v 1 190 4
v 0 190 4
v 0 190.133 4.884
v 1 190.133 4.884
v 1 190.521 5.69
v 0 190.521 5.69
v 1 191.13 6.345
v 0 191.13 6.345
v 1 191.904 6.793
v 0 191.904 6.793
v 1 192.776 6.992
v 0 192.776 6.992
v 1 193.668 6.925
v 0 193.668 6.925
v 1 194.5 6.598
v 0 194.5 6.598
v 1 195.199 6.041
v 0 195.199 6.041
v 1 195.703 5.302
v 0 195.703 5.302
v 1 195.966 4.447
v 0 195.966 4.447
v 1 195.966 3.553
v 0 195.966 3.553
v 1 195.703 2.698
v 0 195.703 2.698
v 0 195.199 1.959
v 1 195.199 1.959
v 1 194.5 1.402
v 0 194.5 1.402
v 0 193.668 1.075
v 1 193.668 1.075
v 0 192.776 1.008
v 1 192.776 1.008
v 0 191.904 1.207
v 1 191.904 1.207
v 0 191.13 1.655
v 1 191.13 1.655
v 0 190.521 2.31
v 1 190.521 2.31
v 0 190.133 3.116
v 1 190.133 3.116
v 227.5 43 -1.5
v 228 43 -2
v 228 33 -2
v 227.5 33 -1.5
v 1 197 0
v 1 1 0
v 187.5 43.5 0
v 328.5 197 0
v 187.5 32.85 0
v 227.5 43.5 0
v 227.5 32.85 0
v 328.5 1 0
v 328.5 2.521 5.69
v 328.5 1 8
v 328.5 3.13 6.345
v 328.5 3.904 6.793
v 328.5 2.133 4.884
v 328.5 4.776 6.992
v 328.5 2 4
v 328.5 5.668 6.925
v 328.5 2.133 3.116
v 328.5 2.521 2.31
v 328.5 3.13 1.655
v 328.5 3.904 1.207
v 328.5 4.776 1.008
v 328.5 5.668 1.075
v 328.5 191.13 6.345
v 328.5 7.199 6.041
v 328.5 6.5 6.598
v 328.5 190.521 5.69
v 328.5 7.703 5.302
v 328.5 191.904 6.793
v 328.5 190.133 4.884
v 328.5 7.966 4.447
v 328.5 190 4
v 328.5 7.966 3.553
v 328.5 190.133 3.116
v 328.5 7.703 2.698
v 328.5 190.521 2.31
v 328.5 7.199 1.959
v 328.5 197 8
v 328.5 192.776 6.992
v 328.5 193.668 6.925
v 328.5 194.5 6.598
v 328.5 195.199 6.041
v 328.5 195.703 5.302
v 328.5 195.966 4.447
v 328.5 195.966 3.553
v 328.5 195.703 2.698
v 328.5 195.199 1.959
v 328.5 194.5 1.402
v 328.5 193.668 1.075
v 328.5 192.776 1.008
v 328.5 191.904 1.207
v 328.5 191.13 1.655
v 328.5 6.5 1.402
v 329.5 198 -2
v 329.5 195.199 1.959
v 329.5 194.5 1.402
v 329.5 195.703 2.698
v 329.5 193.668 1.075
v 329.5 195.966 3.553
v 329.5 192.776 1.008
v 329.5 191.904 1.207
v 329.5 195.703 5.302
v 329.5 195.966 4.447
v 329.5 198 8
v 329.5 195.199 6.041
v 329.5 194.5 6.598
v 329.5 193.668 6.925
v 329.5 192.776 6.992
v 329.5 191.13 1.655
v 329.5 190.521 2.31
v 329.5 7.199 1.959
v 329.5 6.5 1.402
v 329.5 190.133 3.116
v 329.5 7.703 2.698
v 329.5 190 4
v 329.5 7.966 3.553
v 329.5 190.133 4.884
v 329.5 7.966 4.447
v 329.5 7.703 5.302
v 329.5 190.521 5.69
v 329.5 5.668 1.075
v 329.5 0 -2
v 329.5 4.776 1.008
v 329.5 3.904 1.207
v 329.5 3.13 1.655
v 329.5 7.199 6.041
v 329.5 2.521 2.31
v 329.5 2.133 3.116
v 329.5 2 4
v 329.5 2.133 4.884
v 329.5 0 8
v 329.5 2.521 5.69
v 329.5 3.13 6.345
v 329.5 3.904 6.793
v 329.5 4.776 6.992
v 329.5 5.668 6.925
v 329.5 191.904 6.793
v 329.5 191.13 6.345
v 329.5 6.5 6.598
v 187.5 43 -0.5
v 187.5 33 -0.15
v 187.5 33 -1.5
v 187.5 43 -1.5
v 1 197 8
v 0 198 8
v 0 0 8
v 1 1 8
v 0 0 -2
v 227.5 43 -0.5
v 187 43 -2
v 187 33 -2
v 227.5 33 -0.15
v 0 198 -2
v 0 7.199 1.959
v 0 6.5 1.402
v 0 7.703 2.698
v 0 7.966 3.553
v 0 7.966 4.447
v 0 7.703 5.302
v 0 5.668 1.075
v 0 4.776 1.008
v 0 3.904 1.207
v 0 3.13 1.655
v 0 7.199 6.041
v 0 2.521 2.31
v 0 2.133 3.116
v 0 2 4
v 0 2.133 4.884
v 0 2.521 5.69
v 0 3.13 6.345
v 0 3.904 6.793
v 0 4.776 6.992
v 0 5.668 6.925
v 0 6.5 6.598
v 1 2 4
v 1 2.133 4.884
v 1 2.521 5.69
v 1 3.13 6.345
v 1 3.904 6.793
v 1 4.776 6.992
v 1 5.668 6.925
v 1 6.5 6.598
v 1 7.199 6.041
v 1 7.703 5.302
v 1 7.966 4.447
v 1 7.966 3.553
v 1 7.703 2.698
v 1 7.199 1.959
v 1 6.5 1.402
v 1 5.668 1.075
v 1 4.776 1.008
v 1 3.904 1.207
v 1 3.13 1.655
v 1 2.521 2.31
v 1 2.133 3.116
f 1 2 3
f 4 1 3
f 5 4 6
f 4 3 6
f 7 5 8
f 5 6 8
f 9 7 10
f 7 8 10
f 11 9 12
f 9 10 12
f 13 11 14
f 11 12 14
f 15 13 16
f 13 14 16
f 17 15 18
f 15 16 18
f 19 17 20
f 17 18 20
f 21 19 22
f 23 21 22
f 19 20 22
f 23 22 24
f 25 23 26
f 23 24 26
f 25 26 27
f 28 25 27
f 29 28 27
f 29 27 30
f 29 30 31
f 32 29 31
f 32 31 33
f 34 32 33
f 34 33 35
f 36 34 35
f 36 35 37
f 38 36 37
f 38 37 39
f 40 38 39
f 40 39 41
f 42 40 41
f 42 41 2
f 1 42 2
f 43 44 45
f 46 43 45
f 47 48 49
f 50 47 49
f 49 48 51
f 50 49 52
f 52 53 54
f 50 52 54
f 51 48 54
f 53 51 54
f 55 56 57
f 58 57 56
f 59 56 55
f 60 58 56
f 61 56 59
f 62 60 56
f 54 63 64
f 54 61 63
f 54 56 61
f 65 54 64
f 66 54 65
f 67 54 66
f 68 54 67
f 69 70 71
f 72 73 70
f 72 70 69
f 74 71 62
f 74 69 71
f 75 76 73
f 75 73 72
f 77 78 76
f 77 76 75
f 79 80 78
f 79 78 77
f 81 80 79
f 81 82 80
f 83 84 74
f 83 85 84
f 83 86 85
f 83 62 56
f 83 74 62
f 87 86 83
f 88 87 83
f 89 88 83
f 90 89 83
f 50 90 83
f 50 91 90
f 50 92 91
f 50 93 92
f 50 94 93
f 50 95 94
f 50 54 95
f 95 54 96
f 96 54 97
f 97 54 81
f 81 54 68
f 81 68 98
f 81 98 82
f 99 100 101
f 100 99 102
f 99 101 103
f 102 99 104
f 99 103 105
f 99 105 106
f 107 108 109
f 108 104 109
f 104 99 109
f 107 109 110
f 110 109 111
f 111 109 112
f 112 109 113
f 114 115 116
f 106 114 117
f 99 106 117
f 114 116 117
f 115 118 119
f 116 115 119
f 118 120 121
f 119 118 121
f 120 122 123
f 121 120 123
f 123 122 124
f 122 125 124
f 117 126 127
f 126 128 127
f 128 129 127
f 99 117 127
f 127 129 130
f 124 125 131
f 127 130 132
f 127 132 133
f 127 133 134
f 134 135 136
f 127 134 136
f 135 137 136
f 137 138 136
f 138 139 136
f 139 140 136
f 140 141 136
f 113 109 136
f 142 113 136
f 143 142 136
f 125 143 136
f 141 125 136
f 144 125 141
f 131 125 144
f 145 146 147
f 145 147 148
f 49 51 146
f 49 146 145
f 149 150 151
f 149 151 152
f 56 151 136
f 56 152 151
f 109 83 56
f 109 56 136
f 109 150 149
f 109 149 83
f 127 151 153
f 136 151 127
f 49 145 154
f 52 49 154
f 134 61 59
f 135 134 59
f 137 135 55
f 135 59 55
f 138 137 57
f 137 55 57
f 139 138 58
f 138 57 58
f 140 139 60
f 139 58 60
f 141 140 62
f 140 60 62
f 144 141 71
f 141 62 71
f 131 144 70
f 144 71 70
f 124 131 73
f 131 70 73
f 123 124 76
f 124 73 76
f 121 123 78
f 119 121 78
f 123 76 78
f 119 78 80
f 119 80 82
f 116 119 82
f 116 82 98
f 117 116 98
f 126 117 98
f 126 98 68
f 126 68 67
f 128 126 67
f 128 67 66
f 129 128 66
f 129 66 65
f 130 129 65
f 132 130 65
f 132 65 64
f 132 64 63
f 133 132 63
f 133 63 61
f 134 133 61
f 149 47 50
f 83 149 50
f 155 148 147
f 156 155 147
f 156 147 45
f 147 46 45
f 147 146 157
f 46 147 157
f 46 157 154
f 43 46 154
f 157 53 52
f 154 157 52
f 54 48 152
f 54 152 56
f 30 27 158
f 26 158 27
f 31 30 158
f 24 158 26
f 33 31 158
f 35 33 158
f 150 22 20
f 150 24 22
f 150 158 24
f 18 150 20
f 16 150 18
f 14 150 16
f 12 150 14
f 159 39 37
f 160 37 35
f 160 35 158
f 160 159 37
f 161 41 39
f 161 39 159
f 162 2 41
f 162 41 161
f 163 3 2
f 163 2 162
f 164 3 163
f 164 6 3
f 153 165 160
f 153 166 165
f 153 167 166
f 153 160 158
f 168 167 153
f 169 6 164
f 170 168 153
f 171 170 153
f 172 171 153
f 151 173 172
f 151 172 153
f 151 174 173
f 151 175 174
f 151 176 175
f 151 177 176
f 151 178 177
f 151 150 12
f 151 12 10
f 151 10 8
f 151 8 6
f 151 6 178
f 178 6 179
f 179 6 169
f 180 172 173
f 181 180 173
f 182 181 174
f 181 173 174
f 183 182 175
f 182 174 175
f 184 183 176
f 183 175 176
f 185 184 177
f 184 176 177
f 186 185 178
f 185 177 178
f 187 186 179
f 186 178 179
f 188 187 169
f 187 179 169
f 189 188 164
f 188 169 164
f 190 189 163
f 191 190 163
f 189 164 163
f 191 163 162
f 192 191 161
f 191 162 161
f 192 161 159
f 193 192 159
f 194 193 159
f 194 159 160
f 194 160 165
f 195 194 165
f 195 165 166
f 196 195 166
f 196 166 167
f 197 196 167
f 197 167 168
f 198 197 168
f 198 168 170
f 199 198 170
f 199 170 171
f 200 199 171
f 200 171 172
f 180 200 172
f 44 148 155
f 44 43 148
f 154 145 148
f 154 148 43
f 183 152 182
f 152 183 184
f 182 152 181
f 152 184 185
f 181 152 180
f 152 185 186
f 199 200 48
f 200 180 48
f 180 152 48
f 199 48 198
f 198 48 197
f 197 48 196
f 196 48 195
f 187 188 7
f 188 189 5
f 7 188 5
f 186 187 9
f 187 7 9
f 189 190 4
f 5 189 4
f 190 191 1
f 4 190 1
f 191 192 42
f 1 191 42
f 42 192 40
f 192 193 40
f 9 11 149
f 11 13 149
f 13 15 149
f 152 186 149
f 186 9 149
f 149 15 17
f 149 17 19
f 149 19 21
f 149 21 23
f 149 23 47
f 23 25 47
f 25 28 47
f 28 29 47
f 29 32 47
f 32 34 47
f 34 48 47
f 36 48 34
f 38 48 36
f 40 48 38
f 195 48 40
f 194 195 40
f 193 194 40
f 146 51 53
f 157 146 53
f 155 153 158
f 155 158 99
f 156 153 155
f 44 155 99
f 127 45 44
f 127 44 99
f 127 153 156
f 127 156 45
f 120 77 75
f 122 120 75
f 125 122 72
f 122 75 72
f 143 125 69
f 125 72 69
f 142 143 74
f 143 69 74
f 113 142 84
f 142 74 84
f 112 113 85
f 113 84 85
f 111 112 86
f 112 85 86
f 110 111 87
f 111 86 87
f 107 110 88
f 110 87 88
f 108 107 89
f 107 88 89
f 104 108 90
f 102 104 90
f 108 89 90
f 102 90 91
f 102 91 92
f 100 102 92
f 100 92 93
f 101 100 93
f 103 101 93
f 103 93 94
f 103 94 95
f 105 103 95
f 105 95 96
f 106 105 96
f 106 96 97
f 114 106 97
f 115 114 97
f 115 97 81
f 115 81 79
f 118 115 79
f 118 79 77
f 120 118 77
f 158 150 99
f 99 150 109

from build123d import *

# Parameters (mm, degrees)
SKETCH_W        = 329.5
SKETCH_H        = 198
SKETCH_W_2      = 327.5
SKETCH_H_2      = 196
PAD_DEPTH       = 8
SKETCH001_W     = 329.5
SKETCH001_H     = 198
PAD001_DEPTH    = 2
SKETCH002_W     = 40
SKETCH002_H     = 10
POCKET_DEPTH    = 2.001
CHAMFER_SIZE    = 0.15
CHAMFER001_SIZE = 0.5
CHAMFER002_SIZE = 0.5
SKETCH003_R     = 3
POCKET001_DEPTH = 329.501


with BuildPart() as part:
    # Sketch → Pad (new body)
    with BuildSketch(Plane.XY):
        with Locations((164.75, 99)):
            Rectangle(SKETCH_W, SKETCH_H)
        with Locations((164.75, 99)):
            Rectangle(SKETCH_W_2, SKETCH_H_2, mode=Mode.SUBTRACT)
    extrude(amount=PAD_DEPTH)

    # Sketch001 (on Face9 of Pad) → Pad001 (join)
    with BuildSketch(Plane(origin=(0, 0, 0), x_dir=(1, 0, 0), z_dir=(0, 0, -1))):
        with Locations((164.75, -99)):
            Rectangle(SKETCH001_W, SKETCH001_H)
    extrude(amount=PAD001_DEPTH)

    # Sketch002 (on Face15 of Pad001) → Pocket (cut, through all)
    with BuildSketch(Plane.XY):
        with Locations((207.5, 38)):
            Rectangle(SKETCH002_W, SKETCH002_H)
    extrude(amount=-POCKET_DEPTH, mode=Mode.SUBTRACT)

    # Chamfer
    chamfer_edges = [part.edges().sort_by_distance(p)[0] for p in [
        (207.5, 33, 0),
    ]]
    chamfer(chamfer_edges, length=CHAMFER_SIZE)

    # Chamfer001
    chamfer001_edges = [part.edges().sort_by_distance(p)[0] for p in [
        (207.5, 43, 0),
    ]]
    chamfer(chamfer001_edges, length=CHAMFER001_SIZE)

    # Chamfer002
    chamfer002_edges = [part.edges().sort_by_distance(p)[0] for p in [
        (187.5, 38, -2),
        (227.5, 38, -2),
    ]]
    chamfer(chamfer002_edges, length=CHAMFER002_SIZE)

    # Sketch003 (on Face21 of Chamfer002) → Pocket001 (cut, through all)
    with BuildSketch(Plane(origin=(0, 0, 0), x_dir=(0, -1, 0), z_dir=(-1, 0, 0))):
        with Locations((-193, 4)):
            Circle(SKETCH003_R)
        with Locations((-5, 4)):
            Circle(SKETCH003_R)
    extrude(amount=-POCKET001_DEPTH, mode=Mode.SUBTRACT)


solid = part.part
